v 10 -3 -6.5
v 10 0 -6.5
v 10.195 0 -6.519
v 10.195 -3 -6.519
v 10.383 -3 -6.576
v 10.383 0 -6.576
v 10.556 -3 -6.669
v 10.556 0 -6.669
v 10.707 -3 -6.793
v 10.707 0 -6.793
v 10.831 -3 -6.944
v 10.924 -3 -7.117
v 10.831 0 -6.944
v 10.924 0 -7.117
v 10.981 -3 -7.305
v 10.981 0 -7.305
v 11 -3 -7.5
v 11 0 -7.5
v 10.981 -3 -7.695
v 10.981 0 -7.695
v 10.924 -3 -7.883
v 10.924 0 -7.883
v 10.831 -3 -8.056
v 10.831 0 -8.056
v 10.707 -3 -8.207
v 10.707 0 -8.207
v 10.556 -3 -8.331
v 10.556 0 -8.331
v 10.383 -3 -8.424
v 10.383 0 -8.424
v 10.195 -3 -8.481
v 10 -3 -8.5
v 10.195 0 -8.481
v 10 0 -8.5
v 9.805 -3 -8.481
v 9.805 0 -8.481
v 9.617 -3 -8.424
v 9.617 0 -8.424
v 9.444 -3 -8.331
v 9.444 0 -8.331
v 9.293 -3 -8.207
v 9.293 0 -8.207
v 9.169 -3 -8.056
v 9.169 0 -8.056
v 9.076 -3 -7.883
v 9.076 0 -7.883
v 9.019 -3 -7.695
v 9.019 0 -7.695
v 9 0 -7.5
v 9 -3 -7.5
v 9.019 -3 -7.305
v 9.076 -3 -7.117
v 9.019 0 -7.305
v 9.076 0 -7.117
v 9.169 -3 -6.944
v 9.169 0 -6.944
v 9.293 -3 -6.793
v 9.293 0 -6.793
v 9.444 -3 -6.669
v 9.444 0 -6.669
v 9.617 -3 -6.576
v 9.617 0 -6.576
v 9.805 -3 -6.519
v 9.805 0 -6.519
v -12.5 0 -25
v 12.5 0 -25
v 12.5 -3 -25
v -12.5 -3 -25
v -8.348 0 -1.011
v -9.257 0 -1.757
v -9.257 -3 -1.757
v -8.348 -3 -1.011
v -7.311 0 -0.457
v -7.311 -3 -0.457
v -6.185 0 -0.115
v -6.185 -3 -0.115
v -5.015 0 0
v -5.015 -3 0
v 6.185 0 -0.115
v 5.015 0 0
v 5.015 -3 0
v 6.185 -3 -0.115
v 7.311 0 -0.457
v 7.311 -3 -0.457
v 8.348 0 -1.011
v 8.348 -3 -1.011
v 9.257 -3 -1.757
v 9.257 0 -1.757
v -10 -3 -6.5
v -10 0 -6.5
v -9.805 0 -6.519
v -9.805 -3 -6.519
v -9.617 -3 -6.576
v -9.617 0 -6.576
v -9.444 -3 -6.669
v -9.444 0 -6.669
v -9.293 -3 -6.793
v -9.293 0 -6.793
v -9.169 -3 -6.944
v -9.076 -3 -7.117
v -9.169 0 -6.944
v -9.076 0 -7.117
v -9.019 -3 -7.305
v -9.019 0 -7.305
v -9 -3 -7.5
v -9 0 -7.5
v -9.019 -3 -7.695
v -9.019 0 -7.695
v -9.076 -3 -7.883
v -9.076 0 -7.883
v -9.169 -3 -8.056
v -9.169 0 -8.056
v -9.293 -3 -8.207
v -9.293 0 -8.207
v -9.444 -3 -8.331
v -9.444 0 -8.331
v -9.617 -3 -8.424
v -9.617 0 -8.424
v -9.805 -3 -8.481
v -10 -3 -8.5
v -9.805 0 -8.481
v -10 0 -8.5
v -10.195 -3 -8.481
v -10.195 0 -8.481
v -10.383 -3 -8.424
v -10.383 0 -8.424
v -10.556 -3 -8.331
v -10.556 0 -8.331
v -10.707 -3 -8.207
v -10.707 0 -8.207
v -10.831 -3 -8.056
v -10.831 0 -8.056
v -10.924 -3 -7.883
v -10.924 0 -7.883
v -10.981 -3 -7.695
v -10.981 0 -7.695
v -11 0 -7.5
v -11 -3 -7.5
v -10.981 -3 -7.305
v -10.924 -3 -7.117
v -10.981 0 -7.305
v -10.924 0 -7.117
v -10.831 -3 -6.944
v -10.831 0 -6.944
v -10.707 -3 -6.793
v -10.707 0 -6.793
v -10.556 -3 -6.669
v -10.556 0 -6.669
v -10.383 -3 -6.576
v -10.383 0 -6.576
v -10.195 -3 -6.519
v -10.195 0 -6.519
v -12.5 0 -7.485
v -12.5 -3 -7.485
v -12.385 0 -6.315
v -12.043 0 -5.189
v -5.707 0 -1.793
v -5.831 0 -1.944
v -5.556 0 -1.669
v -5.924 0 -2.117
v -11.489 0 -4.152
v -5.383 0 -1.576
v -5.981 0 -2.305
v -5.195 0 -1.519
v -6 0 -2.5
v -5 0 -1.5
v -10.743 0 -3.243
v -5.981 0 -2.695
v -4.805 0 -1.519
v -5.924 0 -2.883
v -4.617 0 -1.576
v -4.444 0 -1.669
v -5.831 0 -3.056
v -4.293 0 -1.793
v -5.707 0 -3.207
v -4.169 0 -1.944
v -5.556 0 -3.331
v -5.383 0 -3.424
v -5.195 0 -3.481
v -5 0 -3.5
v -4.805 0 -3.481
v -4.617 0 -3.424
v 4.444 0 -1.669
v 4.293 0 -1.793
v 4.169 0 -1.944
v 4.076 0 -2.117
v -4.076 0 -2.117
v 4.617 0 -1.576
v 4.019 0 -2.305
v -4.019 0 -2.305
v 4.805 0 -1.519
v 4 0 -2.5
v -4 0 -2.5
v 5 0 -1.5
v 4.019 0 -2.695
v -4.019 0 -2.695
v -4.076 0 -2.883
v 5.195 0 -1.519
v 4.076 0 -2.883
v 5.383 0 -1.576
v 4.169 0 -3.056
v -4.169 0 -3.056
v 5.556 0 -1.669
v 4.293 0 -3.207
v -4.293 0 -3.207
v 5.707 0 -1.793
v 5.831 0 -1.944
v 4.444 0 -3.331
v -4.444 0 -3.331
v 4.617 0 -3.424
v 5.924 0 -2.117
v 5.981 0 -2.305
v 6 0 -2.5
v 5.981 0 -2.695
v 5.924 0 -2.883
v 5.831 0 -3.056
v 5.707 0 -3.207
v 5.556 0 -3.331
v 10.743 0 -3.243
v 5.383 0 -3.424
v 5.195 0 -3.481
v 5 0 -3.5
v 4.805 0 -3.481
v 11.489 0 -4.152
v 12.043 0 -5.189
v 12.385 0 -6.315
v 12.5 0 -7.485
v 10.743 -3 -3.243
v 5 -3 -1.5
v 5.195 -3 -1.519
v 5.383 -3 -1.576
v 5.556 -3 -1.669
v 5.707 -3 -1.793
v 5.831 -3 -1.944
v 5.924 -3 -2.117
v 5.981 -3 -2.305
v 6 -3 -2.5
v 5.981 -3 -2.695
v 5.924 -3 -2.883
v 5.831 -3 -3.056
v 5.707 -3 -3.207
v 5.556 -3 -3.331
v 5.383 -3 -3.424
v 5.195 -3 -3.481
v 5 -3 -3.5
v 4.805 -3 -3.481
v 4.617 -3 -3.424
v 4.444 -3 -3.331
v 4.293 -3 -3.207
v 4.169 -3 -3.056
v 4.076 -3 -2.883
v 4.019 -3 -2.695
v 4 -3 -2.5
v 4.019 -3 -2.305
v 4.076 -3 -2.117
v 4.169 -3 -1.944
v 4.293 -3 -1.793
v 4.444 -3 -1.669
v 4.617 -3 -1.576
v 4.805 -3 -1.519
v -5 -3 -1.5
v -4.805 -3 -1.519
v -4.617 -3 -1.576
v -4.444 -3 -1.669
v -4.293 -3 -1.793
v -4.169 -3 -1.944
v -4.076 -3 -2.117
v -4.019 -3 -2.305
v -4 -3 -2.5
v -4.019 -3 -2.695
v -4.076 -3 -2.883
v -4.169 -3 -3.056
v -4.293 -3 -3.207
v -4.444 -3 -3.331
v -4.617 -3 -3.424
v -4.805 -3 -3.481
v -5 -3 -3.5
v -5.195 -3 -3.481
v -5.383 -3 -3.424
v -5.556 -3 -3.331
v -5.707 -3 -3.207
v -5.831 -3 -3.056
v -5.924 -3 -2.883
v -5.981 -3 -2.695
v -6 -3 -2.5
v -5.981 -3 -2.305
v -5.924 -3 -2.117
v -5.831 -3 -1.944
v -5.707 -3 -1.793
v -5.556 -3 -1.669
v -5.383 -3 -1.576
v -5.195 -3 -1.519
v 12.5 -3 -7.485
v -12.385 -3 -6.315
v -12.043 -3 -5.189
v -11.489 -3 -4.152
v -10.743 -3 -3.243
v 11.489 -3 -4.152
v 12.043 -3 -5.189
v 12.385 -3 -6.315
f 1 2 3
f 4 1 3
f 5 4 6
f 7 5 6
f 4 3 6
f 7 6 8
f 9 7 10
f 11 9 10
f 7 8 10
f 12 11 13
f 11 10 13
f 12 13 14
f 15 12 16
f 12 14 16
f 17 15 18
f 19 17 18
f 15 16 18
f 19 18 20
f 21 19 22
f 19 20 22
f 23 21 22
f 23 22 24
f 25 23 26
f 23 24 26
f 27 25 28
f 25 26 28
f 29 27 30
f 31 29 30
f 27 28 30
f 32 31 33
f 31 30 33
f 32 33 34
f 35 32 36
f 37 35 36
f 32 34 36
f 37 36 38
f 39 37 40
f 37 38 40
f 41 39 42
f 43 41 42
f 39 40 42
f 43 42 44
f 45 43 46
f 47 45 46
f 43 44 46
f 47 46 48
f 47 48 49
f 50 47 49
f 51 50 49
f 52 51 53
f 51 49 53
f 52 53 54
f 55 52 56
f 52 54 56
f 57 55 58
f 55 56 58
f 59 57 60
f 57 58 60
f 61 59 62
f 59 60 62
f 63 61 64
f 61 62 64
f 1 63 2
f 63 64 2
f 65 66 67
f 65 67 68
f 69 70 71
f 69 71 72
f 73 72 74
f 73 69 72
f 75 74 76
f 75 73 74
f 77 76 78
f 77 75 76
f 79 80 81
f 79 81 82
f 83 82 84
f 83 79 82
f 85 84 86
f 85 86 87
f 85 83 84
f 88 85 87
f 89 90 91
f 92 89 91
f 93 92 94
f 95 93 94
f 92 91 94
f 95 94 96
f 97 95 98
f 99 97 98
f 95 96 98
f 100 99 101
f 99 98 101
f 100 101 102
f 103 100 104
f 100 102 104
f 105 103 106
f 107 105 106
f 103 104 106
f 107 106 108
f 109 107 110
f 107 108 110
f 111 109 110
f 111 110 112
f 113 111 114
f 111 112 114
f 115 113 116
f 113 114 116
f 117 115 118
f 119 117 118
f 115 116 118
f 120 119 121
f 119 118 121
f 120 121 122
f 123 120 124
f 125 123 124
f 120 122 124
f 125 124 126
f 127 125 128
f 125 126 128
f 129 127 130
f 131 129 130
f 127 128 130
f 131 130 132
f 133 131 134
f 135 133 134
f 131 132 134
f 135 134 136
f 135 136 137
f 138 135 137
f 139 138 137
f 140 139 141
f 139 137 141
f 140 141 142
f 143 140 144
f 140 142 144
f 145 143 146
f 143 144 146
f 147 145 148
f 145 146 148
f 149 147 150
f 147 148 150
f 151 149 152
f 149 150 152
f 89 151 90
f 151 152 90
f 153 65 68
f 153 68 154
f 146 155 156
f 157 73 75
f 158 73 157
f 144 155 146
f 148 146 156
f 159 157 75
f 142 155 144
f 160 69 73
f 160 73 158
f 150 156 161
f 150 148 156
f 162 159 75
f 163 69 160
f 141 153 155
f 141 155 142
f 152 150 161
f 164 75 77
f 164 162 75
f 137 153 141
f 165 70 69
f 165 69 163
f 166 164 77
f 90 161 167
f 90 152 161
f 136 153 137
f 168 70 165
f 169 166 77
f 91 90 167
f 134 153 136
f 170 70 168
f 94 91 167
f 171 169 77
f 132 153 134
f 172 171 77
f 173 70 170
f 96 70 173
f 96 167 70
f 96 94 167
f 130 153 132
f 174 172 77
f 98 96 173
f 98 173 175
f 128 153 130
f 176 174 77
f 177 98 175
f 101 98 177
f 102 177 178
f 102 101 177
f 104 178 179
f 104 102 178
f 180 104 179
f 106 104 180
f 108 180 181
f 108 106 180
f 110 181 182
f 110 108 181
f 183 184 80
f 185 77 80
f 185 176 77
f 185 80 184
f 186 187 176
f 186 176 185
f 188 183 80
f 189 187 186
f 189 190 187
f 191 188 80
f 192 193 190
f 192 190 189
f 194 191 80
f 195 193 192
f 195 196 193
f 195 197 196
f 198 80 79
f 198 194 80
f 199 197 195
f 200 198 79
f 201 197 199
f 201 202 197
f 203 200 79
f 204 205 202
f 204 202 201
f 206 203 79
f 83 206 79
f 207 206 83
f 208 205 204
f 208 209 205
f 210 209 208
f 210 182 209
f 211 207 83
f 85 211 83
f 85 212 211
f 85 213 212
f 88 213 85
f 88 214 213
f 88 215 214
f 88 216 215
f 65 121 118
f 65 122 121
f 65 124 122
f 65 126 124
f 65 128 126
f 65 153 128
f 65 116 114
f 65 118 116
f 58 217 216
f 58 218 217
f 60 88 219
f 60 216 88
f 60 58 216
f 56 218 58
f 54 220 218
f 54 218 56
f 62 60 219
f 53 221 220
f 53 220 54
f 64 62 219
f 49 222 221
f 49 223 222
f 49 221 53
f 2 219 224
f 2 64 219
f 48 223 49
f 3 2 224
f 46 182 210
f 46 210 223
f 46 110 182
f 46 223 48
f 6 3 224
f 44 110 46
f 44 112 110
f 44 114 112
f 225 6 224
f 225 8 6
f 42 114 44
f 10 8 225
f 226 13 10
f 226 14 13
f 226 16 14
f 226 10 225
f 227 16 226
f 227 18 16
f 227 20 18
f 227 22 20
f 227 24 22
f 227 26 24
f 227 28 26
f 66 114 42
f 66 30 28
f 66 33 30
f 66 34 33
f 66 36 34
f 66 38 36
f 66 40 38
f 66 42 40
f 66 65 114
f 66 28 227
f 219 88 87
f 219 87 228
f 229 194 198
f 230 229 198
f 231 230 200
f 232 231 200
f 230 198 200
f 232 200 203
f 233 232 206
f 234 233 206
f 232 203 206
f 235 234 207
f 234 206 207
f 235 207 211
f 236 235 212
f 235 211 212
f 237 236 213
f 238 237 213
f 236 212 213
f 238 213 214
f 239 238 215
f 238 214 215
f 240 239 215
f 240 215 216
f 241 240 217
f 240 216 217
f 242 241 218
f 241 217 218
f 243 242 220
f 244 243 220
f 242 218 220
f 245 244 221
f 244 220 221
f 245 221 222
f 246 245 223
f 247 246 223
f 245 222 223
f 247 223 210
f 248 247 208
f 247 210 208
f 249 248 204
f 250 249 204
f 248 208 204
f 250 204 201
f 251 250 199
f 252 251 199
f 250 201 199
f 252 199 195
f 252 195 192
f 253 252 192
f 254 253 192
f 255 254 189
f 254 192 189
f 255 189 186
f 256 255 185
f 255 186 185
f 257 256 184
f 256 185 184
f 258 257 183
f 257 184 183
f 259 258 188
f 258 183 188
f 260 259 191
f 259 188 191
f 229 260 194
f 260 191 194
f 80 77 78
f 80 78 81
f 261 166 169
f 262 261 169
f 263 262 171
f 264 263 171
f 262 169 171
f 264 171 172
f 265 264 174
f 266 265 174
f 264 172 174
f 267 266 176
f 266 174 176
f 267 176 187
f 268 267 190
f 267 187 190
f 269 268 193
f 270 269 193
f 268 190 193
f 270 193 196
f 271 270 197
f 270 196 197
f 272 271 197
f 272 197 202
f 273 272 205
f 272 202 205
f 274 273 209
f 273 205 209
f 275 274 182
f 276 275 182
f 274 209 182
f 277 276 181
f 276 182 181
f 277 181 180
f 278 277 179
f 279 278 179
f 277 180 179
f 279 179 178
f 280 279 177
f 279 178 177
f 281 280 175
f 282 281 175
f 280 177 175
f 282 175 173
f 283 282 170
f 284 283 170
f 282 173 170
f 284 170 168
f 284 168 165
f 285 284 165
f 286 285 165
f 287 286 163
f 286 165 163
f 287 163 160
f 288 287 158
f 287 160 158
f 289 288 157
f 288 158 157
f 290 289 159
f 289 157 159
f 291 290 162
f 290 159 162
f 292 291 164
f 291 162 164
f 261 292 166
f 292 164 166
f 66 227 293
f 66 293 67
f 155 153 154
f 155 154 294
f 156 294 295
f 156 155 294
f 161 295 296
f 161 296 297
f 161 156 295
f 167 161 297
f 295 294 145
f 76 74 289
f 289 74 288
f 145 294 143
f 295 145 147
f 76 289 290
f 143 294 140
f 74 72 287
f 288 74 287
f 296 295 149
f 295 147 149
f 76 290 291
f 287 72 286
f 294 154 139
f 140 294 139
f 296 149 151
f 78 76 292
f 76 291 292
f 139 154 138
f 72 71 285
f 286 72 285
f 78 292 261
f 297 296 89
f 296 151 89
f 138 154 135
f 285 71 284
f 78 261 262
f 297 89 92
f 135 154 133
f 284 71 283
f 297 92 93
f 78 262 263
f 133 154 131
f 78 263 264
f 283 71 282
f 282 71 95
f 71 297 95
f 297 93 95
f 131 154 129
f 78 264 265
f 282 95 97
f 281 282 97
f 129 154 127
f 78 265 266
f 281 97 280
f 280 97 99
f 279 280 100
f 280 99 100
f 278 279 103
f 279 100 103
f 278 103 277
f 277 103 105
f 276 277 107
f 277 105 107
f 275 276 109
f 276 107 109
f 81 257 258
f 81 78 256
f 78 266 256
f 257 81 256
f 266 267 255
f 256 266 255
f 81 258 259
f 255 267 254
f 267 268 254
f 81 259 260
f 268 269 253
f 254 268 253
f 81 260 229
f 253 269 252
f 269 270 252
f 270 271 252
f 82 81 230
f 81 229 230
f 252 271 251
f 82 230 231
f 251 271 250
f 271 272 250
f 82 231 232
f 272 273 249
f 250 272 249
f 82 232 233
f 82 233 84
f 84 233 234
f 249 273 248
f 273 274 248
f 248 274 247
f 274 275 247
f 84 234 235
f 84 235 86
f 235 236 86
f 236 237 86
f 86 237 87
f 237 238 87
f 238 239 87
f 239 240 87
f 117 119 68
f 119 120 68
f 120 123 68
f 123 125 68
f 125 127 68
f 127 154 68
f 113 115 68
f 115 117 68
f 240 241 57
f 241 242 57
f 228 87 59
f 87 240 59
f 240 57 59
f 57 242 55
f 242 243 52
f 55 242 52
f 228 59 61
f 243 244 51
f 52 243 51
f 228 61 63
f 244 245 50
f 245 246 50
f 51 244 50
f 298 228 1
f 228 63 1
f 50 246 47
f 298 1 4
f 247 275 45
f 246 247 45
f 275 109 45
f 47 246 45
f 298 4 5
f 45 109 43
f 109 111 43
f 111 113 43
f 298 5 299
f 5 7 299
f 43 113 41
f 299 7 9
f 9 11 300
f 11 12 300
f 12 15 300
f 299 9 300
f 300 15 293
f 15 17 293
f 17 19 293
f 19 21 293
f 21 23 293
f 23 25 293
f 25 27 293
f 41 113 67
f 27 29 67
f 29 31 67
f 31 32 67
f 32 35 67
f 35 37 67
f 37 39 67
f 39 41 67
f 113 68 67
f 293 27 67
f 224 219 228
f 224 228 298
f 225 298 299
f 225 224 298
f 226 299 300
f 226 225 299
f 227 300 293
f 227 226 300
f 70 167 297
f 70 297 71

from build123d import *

# Parameters (mm, degrees)
CROQUIS1_R        = 1
BRIDA_BASE1_DEPTH = 3


# Sheet-metal steps are written as plain solids
with BuildPart() as part:
    # Croquis1 → Brida base1 (new body)
    with BuildSketch(Plane(origin=(0, 0, 0), x_dir=(1, 0, 0), z_dir=(0, 1, 0))):
        with BuildLine():
            Line((-5.014718626, 0), (5.014718626, 0))
            ThreePointArc((5.014718626, 0), (7.31081922, 0.456722805), (9.257359313, 1.757359313))
            Line((9.257359313, 1.757359313), (10.742640687, 3.242640687))
            ThreePointArc((10.742640687, 3.242640687), (12.043277195, 5.18918078), (12.5, 7.485281374))
            Line((12.5, 7.485281374), (12.5, 25))
            Line((12.5, 25), (-12.5, 25))
            Line((-12.5, 25), (-12.5, 7.485281374))
            ThreePointArc((-12.5, 7.485281374), (-12.043277195, 5.18918078), (-10.742640687, 3.242640687))
            Line((-10.742640687, 3.242640687), (-9.257359313, 1.757359313))
            ThreePointArc((-9.257359313, 1.757359313), (-7.31081922, 0.456722805), (-5.014718626, 0))
        make_face()
        with Locations(Location((-10, 7.5, 0), (0, 0, 270))):
            Circle(CROQUIS1_R, mode=Mode.SUBTRACT)
        with Locations(Location((-5, 2.5, 0), (0, 0, 270))):
            Circle(CROQUIS1_R, mode=Mode.SUBTRACT)
        with Locations(Location((10, 7.5, 0), (0, 0, 270))):
            Circle(CROQUIS1_R, mode=Mode.SUBTRACT)
        with Locations(Location((5, 2.5, 0), (0, 0, 270))):
            Circle(CROQUIS1_R, mode=Mode.SUBTRACT)
    extrude(amount=-BRIDA_BASE1_DEPTH)


solid = part.part
